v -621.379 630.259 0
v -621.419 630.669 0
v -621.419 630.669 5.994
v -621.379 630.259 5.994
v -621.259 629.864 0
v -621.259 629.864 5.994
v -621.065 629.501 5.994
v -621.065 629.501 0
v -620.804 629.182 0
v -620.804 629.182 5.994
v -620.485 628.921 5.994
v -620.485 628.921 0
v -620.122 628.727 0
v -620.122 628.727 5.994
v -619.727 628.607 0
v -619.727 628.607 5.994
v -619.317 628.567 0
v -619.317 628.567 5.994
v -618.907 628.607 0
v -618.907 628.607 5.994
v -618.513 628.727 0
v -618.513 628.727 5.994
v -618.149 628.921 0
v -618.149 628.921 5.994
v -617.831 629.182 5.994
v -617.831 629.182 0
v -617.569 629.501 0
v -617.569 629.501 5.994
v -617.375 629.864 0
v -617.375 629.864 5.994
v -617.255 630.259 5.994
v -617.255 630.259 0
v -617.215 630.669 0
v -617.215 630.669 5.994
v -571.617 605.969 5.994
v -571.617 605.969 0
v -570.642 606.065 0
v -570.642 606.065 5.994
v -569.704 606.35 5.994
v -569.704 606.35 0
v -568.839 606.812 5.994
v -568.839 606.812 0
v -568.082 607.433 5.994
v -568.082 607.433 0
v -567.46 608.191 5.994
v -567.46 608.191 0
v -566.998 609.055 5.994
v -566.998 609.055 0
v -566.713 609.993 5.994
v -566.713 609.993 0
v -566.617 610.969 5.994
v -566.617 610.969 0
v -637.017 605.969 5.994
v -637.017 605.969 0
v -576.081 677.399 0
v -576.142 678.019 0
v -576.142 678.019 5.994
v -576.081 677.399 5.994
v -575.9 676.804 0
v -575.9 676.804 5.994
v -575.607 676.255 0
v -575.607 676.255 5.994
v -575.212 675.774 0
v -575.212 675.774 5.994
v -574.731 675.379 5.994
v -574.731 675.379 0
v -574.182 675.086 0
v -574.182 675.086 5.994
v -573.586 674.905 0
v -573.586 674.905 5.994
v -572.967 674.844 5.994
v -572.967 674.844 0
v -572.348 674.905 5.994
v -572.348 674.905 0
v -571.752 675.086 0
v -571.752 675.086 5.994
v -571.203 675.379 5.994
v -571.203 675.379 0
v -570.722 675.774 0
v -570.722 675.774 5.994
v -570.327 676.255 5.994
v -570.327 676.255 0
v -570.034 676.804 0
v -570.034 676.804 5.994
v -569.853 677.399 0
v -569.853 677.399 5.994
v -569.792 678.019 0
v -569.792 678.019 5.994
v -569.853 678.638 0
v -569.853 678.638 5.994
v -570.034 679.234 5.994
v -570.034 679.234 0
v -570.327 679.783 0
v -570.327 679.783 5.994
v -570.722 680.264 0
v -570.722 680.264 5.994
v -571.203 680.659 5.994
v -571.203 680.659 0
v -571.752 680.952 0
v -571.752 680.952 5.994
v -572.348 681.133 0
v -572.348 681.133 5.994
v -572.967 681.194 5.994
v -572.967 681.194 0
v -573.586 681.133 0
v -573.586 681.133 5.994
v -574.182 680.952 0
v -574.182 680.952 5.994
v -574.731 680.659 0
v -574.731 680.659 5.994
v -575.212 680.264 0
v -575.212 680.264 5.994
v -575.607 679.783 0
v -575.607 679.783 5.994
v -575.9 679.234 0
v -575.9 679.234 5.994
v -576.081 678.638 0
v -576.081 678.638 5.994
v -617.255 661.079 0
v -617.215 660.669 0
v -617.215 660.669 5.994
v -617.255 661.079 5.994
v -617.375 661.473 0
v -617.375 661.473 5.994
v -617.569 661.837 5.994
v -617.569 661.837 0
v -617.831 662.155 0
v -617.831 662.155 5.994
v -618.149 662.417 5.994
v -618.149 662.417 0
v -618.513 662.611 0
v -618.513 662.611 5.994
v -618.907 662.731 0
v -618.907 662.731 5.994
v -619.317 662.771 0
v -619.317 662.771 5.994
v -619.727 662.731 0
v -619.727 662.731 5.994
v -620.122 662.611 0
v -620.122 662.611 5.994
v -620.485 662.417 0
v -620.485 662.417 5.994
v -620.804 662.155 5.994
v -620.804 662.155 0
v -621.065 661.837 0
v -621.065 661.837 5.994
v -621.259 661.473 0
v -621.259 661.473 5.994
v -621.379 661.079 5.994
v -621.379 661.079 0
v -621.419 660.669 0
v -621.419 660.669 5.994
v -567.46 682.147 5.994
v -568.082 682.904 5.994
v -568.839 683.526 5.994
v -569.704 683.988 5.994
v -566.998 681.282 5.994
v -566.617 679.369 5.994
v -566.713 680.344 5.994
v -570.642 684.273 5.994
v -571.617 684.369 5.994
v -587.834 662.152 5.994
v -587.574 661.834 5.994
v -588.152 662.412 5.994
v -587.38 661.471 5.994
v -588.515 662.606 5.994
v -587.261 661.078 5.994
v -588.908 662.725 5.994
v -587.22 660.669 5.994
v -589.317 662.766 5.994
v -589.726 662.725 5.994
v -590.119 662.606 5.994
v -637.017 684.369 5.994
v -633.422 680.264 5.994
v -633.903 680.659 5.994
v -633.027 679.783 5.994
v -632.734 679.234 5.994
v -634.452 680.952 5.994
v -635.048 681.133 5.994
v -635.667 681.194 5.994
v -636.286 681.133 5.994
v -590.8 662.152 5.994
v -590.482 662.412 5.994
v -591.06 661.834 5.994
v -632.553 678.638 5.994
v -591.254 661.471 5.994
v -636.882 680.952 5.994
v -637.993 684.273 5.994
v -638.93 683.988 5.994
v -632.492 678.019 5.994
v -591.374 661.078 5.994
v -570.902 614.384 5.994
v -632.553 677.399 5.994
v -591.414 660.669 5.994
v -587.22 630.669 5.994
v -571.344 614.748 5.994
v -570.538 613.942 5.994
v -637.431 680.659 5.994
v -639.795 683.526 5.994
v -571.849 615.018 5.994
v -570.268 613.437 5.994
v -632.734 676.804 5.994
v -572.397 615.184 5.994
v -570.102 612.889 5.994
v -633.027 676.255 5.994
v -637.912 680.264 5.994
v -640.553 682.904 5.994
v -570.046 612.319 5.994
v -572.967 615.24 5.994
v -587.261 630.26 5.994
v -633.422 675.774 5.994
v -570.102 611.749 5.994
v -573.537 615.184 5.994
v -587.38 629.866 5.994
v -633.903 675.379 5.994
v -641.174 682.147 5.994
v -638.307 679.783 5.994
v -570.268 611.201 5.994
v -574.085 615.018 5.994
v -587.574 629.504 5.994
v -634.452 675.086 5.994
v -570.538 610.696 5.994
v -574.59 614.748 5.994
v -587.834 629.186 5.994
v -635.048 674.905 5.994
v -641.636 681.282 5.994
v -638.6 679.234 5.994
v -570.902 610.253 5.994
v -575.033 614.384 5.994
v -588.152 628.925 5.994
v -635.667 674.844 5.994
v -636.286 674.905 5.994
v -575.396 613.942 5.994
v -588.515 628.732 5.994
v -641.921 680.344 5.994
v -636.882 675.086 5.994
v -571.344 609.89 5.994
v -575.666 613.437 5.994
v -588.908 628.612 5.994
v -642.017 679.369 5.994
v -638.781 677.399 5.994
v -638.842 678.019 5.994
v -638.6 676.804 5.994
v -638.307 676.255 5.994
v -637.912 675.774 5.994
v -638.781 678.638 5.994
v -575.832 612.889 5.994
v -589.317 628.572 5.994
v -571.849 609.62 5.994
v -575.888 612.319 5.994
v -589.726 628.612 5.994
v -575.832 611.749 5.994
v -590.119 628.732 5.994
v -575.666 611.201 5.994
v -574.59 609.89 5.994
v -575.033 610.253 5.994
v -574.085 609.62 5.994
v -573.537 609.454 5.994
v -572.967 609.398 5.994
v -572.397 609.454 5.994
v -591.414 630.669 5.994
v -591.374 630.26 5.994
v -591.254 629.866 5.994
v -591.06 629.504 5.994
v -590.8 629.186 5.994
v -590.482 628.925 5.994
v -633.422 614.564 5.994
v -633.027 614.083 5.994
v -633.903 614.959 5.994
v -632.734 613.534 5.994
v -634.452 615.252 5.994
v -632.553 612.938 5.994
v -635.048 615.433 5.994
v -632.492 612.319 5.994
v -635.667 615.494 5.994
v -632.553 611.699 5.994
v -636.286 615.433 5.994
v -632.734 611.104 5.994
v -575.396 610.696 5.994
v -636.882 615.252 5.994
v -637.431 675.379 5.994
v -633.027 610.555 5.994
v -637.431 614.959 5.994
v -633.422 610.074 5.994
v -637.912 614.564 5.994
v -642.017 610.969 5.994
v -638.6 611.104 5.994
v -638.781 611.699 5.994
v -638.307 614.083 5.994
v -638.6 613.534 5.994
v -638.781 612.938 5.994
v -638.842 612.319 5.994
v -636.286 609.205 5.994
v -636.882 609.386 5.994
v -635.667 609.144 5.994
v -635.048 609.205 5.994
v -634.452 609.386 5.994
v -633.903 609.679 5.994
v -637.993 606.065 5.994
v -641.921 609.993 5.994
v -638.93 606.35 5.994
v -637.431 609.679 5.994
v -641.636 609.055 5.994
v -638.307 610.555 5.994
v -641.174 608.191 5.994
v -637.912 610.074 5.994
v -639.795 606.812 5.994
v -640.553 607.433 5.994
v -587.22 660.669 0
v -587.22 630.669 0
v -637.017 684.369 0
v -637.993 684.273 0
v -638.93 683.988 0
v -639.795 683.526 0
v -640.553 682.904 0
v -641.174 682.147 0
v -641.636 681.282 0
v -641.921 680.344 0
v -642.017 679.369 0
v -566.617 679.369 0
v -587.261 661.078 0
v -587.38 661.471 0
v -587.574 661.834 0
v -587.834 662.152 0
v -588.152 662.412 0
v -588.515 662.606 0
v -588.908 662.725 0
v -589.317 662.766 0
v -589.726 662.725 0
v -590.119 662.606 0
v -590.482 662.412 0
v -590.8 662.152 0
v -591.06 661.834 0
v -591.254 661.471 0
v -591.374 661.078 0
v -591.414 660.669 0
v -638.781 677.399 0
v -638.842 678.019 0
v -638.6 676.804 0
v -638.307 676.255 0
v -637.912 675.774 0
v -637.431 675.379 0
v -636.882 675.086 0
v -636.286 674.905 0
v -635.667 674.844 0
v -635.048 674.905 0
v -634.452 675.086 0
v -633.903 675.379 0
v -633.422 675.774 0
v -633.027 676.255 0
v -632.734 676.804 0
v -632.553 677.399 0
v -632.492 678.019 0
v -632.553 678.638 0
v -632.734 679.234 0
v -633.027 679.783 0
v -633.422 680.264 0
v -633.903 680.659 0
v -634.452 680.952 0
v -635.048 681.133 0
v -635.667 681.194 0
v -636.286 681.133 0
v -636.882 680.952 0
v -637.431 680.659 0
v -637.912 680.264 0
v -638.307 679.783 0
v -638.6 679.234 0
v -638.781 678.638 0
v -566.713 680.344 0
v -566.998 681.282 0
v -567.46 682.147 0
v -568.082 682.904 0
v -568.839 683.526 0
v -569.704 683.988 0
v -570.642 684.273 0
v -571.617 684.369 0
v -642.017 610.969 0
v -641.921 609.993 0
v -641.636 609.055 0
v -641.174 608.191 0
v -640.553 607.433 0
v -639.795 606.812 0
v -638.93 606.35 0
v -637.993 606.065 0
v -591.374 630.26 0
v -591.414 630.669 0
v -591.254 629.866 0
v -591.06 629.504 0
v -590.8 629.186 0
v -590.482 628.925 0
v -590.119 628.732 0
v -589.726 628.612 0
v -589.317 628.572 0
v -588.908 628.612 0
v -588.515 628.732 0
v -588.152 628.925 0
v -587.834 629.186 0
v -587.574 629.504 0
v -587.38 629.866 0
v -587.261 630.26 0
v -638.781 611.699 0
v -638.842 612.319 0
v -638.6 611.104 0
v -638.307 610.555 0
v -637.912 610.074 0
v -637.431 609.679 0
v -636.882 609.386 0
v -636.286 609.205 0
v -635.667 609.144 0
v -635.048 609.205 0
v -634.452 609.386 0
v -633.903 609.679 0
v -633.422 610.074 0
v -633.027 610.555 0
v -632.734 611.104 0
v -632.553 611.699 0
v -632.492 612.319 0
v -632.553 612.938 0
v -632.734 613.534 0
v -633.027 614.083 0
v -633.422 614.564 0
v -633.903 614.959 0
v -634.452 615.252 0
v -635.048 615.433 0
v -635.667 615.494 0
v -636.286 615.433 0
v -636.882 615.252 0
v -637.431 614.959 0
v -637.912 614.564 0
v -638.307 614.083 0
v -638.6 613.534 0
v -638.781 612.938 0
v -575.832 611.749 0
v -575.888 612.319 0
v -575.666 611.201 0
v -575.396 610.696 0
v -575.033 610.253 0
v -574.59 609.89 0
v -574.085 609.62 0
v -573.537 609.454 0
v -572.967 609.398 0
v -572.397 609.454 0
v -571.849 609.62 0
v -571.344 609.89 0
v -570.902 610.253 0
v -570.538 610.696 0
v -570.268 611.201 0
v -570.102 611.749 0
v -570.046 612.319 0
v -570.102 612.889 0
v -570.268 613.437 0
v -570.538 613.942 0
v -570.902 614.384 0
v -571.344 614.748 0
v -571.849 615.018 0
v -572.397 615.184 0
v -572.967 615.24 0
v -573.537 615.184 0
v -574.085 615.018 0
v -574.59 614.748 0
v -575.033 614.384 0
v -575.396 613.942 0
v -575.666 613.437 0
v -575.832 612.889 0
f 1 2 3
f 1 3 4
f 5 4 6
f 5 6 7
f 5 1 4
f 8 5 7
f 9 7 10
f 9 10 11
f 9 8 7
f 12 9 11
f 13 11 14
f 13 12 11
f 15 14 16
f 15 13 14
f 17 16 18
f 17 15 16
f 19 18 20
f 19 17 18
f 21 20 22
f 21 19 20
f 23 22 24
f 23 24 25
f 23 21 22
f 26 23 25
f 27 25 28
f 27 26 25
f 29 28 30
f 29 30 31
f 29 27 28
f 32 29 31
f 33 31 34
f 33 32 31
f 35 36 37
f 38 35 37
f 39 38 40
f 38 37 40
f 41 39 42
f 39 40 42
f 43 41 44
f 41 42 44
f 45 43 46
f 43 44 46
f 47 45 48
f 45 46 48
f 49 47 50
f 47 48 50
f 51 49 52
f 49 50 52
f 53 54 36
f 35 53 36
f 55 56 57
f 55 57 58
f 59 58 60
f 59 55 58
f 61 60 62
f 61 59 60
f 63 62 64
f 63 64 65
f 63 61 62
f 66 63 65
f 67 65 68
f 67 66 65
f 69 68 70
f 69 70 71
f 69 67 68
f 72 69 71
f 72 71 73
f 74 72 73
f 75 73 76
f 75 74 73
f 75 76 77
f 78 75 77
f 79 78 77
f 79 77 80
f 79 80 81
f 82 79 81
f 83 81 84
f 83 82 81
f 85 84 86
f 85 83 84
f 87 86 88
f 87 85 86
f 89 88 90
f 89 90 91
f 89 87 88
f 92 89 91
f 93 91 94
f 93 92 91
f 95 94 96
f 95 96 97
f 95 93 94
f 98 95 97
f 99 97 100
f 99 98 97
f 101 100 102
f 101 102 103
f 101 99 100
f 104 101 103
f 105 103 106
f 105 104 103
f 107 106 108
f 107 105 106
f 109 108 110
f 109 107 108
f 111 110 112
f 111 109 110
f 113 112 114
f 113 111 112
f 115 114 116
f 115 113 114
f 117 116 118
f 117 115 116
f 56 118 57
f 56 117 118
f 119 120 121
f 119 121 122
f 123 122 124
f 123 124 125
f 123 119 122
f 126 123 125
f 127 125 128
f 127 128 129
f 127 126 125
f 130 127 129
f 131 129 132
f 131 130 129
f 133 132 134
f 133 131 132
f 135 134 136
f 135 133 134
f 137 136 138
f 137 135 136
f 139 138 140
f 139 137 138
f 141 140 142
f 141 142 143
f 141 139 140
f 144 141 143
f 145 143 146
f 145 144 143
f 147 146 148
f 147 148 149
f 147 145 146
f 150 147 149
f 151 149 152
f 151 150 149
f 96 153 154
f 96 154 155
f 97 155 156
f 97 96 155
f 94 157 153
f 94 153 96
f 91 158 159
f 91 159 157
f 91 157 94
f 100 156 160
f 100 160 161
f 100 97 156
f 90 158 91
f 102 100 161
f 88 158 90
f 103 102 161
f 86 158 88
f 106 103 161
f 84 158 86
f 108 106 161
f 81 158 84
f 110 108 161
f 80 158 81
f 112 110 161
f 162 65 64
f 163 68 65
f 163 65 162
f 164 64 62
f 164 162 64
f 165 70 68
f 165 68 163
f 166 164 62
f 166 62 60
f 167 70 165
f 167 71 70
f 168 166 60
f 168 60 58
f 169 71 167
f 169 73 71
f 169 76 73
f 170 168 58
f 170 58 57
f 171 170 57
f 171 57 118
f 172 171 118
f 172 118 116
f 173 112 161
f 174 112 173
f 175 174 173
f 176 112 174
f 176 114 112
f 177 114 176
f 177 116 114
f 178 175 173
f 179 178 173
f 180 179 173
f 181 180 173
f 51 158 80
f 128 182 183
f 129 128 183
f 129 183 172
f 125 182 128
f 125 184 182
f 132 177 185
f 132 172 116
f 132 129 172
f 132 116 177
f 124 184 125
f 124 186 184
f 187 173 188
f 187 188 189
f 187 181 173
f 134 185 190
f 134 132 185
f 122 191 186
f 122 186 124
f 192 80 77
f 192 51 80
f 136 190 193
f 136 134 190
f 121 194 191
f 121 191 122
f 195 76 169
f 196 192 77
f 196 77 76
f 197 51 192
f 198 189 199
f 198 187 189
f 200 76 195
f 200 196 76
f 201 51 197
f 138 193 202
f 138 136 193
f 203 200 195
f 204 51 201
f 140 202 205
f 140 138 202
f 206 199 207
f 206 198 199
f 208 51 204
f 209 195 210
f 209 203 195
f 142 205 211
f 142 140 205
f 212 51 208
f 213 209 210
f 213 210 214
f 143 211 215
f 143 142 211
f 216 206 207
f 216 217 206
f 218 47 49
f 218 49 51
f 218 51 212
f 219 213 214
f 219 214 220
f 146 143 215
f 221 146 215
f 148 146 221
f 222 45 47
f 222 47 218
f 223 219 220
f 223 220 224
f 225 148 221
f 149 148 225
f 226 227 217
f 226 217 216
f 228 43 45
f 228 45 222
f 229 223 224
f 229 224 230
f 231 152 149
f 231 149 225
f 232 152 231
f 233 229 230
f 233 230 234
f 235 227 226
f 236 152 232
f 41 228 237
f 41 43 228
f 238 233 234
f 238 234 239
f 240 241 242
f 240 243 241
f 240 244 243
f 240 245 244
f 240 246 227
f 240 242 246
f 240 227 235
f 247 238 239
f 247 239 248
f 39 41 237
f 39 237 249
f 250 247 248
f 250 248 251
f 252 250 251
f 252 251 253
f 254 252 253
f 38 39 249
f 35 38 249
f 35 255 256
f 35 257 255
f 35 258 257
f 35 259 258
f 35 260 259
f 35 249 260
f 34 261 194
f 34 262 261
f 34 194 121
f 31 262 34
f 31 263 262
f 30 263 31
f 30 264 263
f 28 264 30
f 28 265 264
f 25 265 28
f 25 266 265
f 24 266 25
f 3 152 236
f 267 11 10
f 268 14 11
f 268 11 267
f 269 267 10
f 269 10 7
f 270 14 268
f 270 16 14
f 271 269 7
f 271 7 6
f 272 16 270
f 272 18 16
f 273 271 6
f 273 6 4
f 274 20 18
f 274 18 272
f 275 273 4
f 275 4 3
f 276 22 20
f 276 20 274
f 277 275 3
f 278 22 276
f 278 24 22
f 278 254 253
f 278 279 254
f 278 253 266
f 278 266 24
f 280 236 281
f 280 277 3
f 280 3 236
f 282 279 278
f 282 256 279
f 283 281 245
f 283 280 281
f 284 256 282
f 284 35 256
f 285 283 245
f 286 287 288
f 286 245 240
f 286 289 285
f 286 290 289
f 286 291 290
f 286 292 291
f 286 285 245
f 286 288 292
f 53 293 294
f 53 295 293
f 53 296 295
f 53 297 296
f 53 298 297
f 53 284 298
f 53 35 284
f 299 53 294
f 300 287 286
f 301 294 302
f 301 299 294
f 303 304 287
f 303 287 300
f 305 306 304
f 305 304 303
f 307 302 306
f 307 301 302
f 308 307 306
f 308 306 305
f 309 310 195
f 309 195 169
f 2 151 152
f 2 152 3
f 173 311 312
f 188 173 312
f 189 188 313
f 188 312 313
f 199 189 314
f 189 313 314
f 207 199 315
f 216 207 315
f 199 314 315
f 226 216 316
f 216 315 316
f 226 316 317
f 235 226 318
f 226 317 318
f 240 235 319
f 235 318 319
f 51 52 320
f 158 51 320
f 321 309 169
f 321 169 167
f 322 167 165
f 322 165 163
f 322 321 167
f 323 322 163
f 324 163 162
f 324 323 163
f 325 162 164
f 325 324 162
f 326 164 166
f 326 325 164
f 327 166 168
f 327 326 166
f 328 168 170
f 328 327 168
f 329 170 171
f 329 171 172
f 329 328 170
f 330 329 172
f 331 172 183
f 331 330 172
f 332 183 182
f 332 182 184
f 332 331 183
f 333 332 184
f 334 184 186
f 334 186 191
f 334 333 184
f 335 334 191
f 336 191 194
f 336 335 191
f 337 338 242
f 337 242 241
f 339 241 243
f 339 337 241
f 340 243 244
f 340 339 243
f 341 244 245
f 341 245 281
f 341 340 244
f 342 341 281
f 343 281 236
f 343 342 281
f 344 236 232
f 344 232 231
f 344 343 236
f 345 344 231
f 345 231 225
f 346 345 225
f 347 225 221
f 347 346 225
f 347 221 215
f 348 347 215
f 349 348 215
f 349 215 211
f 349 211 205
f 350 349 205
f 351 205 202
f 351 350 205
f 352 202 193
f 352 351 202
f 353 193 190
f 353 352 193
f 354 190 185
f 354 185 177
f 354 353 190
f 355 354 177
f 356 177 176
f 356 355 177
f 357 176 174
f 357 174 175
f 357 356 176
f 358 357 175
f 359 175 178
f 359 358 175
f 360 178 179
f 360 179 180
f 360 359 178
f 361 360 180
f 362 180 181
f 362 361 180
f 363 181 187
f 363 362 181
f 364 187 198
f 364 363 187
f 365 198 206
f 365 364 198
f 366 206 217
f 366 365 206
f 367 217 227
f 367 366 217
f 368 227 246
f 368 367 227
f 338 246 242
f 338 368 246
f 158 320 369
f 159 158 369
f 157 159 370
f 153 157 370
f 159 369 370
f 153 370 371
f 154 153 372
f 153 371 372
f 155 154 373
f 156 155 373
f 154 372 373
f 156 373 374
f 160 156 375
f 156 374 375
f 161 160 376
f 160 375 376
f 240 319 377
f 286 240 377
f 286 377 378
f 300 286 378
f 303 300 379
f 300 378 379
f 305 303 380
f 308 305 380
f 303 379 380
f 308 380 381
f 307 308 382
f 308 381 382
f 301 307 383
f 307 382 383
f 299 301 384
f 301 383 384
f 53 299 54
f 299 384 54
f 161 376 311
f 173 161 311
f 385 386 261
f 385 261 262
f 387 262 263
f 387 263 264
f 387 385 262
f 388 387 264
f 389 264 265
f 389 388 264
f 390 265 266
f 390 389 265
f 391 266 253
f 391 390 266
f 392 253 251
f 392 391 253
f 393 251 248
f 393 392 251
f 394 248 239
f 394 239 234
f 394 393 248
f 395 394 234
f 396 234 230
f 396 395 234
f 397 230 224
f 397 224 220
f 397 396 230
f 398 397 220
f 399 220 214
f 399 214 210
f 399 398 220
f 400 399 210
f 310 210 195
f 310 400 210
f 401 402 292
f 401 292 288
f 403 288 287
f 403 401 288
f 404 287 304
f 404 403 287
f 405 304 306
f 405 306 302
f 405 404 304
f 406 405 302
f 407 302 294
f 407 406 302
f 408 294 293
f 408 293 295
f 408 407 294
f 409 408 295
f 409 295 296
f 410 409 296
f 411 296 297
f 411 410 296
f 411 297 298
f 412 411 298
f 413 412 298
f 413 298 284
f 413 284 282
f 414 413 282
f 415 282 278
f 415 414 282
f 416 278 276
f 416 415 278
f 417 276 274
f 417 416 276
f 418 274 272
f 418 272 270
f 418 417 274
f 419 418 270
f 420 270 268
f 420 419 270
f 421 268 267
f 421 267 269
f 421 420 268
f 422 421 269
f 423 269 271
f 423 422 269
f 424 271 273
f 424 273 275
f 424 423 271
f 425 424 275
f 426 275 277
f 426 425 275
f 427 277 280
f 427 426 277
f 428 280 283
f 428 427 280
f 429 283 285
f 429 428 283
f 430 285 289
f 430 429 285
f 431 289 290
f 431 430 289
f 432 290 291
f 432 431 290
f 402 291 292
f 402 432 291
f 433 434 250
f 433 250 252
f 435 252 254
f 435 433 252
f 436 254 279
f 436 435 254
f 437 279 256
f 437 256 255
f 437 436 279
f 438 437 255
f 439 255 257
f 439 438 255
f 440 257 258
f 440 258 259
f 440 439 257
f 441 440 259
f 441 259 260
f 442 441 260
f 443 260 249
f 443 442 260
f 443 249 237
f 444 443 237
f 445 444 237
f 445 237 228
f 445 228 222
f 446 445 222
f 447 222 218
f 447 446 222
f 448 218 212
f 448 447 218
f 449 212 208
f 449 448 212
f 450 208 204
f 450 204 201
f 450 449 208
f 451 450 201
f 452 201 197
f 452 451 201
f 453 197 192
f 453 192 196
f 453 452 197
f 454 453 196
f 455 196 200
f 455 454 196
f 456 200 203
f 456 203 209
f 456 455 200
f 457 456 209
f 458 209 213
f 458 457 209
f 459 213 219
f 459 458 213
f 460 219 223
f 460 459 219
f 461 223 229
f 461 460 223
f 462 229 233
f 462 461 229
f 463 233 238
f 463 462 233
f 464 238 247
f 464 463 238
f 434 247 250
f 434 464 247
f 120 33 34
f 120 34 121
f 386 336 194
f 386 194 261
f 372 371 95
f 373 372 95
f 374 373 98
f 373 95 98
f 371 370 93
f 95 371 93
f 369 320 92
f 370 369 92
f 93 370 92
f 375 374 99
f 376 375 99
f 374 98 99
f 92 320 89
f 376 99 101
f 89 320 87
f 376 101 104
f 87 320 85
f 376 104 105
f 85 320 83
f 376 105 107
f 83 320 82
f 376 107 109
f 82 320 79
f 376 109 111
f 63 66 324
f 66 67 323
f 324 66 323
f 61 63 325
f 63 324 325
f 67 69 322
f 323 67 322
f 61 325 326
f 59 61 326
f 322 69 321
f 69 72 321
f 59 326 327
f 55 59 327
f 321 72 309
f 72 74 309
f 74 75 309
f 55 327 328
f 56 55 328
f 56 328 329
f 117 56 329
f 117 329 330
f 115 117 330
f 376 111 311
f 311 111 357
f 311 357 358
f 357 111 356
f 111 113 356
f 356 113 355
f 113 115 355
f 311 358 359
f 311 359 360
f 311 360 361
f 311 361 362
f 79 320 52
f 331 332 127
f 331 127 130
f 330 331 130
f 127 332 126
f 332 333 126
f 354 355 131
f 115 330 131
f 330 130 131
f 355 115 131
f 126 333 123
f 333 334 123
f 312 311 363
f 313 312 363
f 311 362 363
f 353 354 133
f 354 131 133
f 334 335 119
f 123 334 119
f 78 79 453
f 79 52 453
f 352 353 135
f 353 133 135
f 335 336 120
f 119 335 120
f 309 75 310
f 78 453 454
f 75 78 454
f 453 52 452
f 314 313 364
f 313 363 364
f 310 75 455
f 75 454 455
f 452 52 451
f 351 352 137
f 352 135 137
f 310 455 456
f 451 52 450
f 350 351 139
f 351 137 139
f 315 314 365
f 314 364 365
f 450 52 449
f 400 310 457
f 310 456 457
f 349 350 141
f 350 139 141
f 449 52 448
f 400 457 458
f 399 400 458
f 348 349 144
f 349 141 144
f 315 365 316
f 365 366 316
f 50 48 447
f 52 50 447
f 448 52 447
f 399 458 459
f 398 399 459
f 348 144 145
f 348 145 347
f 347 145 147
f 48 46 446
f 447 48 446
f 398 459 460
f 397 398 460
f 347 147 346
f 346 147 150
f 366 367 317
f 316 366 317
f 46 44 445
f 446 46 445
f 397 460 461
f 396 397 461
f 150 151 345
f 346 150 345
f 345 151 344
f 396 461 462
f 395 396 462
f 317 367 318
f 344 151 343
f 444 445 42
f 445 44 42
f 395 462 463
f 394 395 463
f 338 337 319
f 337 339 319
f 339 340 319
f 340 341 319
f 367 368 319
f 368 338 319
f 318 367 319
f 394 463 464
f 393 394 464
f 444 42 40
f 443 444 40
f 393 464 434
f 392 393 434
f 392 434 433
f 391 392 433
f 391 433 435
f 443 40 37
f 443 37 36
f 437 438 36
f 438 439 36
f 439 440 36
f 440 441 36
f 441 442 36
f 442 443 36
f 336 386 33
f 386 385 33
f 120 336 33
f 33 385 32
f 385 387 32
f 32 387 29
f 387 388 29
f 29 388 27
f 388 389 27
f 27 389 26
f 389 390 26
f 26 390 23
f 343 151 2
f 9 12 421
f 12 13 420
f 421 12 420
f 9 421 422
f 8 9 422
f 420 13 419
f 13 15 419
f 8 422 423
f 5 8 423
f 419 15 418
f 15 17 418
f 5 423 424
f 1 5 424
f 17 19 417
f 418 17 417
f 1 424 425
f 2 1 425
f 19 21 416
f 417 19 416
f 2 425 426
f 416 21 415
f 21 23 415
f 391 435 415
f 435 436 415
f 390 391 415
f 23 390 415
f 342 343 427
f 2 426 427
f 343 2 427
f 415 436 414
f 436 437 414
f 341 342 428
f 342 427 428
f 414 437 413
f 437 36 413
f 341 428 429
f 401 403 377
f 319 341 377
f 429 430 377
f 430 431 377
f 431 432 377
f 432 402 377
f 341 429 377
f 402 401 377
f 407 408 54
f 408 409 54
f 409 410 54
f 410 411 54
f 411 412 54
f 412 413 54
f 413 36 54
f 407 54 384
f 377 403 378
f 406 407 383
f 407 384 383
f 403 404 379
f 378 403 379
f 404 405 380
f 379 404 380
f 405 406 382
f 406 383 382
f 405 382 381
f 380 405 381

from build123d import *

# Parameters (mm, degrees)
SKETCH1_R           = 2.921
SKETCH1_R_2         = 3.175
BOSS_EXTRUDE1_DEPTH = 5.9944


with BuildPart() as part:
    # Sketch1 → Boss-Extrude1 (new body)
    with BuildSketch(Plane(origin=(0, 0, 0), x_dir=(-1, 0, 0), z_dir=(0, 0, 1))):
        with BuildLine():
            Line((566.61706408, -610.968899583), (566.61706408, -679.368899583))
            ThreePointArc((566.61706408, -679.368899583), (568.081530174, -682.904433489), (571.61706408, -684.368899583))
            Line((571.61706408, -684.368899583), (637.01706408, -684.368899583))
            ThreePointArc((637.01706408, -684.368899583), (640.552597986, -682.904433489), (642.01706408, -679.368899583))
            Line((642.01706408, -679.368899583), (642.01706408, -610.968899583))
            ThreePointArc((642.01706408, -610.968899583), (640.552597986, -607.433365677), (637.01706408, -605.968899583))
            Line((637.01706408, -605.968899583), (571.61706408, -605.968899583))
            ThreePointArc((571.61706408, -605.968899583), (568.081530174, -607.433365677), (566.61706408, -610.968899583))
        make_face()
        with Locations((572.96706408, -612.318899583)):
            Circle(SKETCH1_R, mode=Mode.SUBTRACT)
        with Locations((635.66706408, -612.318899583)):
            Circle(SKETCH1_R_2, mode=Mode.SUBTRACT)
        with Locations((635.66706408, -678.018899583)):
            Circle(SKETCH1_R_2, mode=Mode.SUBTRACT)
        with Locations((572.96706408, -678.018899583)):
            Circle(SKETCH1_R_2, mode=Mode.SUBTRACT)
        with BuildLine():
            ThreePointArc((587.220270562, -660.668899583), (589.31706408, -662.765693101), (591.413857599, -660.668899583))
            Line((591.413857599, -660.668899583), (591.413857599, -630.668899583))
            ThreePointArc((591.413857599, -630.668899583), (589.31706408, -628.572106065), (587.220270562, -630.668899583))
            Line((587.220270562, -630.668899583), (587.220270562, -660.668899583))
        make_face(mode=Mode.SUBTRACT)
        with BuildLine():
            ThreePointArc((617.214915153, -660.668899583), (619.31706408, -662.771048511), (621.419213008, -660.668899583))
            Line((621.419213008, -660.668899583), (621.419213008, -630.668899583))
            ThreePointArc((621.419213008, -630.668899583), (619.31706408, -628.566750655), (617.214915153, -630.668899583))
            Line((617.214915153, -630.668899583), (617.214915153, -660.668899583))
        make_face(mode=Mode.SUBTRACT)
    extrude(amount=BOSS_EXTRUDE1_DEPTH)


solid = part.part
